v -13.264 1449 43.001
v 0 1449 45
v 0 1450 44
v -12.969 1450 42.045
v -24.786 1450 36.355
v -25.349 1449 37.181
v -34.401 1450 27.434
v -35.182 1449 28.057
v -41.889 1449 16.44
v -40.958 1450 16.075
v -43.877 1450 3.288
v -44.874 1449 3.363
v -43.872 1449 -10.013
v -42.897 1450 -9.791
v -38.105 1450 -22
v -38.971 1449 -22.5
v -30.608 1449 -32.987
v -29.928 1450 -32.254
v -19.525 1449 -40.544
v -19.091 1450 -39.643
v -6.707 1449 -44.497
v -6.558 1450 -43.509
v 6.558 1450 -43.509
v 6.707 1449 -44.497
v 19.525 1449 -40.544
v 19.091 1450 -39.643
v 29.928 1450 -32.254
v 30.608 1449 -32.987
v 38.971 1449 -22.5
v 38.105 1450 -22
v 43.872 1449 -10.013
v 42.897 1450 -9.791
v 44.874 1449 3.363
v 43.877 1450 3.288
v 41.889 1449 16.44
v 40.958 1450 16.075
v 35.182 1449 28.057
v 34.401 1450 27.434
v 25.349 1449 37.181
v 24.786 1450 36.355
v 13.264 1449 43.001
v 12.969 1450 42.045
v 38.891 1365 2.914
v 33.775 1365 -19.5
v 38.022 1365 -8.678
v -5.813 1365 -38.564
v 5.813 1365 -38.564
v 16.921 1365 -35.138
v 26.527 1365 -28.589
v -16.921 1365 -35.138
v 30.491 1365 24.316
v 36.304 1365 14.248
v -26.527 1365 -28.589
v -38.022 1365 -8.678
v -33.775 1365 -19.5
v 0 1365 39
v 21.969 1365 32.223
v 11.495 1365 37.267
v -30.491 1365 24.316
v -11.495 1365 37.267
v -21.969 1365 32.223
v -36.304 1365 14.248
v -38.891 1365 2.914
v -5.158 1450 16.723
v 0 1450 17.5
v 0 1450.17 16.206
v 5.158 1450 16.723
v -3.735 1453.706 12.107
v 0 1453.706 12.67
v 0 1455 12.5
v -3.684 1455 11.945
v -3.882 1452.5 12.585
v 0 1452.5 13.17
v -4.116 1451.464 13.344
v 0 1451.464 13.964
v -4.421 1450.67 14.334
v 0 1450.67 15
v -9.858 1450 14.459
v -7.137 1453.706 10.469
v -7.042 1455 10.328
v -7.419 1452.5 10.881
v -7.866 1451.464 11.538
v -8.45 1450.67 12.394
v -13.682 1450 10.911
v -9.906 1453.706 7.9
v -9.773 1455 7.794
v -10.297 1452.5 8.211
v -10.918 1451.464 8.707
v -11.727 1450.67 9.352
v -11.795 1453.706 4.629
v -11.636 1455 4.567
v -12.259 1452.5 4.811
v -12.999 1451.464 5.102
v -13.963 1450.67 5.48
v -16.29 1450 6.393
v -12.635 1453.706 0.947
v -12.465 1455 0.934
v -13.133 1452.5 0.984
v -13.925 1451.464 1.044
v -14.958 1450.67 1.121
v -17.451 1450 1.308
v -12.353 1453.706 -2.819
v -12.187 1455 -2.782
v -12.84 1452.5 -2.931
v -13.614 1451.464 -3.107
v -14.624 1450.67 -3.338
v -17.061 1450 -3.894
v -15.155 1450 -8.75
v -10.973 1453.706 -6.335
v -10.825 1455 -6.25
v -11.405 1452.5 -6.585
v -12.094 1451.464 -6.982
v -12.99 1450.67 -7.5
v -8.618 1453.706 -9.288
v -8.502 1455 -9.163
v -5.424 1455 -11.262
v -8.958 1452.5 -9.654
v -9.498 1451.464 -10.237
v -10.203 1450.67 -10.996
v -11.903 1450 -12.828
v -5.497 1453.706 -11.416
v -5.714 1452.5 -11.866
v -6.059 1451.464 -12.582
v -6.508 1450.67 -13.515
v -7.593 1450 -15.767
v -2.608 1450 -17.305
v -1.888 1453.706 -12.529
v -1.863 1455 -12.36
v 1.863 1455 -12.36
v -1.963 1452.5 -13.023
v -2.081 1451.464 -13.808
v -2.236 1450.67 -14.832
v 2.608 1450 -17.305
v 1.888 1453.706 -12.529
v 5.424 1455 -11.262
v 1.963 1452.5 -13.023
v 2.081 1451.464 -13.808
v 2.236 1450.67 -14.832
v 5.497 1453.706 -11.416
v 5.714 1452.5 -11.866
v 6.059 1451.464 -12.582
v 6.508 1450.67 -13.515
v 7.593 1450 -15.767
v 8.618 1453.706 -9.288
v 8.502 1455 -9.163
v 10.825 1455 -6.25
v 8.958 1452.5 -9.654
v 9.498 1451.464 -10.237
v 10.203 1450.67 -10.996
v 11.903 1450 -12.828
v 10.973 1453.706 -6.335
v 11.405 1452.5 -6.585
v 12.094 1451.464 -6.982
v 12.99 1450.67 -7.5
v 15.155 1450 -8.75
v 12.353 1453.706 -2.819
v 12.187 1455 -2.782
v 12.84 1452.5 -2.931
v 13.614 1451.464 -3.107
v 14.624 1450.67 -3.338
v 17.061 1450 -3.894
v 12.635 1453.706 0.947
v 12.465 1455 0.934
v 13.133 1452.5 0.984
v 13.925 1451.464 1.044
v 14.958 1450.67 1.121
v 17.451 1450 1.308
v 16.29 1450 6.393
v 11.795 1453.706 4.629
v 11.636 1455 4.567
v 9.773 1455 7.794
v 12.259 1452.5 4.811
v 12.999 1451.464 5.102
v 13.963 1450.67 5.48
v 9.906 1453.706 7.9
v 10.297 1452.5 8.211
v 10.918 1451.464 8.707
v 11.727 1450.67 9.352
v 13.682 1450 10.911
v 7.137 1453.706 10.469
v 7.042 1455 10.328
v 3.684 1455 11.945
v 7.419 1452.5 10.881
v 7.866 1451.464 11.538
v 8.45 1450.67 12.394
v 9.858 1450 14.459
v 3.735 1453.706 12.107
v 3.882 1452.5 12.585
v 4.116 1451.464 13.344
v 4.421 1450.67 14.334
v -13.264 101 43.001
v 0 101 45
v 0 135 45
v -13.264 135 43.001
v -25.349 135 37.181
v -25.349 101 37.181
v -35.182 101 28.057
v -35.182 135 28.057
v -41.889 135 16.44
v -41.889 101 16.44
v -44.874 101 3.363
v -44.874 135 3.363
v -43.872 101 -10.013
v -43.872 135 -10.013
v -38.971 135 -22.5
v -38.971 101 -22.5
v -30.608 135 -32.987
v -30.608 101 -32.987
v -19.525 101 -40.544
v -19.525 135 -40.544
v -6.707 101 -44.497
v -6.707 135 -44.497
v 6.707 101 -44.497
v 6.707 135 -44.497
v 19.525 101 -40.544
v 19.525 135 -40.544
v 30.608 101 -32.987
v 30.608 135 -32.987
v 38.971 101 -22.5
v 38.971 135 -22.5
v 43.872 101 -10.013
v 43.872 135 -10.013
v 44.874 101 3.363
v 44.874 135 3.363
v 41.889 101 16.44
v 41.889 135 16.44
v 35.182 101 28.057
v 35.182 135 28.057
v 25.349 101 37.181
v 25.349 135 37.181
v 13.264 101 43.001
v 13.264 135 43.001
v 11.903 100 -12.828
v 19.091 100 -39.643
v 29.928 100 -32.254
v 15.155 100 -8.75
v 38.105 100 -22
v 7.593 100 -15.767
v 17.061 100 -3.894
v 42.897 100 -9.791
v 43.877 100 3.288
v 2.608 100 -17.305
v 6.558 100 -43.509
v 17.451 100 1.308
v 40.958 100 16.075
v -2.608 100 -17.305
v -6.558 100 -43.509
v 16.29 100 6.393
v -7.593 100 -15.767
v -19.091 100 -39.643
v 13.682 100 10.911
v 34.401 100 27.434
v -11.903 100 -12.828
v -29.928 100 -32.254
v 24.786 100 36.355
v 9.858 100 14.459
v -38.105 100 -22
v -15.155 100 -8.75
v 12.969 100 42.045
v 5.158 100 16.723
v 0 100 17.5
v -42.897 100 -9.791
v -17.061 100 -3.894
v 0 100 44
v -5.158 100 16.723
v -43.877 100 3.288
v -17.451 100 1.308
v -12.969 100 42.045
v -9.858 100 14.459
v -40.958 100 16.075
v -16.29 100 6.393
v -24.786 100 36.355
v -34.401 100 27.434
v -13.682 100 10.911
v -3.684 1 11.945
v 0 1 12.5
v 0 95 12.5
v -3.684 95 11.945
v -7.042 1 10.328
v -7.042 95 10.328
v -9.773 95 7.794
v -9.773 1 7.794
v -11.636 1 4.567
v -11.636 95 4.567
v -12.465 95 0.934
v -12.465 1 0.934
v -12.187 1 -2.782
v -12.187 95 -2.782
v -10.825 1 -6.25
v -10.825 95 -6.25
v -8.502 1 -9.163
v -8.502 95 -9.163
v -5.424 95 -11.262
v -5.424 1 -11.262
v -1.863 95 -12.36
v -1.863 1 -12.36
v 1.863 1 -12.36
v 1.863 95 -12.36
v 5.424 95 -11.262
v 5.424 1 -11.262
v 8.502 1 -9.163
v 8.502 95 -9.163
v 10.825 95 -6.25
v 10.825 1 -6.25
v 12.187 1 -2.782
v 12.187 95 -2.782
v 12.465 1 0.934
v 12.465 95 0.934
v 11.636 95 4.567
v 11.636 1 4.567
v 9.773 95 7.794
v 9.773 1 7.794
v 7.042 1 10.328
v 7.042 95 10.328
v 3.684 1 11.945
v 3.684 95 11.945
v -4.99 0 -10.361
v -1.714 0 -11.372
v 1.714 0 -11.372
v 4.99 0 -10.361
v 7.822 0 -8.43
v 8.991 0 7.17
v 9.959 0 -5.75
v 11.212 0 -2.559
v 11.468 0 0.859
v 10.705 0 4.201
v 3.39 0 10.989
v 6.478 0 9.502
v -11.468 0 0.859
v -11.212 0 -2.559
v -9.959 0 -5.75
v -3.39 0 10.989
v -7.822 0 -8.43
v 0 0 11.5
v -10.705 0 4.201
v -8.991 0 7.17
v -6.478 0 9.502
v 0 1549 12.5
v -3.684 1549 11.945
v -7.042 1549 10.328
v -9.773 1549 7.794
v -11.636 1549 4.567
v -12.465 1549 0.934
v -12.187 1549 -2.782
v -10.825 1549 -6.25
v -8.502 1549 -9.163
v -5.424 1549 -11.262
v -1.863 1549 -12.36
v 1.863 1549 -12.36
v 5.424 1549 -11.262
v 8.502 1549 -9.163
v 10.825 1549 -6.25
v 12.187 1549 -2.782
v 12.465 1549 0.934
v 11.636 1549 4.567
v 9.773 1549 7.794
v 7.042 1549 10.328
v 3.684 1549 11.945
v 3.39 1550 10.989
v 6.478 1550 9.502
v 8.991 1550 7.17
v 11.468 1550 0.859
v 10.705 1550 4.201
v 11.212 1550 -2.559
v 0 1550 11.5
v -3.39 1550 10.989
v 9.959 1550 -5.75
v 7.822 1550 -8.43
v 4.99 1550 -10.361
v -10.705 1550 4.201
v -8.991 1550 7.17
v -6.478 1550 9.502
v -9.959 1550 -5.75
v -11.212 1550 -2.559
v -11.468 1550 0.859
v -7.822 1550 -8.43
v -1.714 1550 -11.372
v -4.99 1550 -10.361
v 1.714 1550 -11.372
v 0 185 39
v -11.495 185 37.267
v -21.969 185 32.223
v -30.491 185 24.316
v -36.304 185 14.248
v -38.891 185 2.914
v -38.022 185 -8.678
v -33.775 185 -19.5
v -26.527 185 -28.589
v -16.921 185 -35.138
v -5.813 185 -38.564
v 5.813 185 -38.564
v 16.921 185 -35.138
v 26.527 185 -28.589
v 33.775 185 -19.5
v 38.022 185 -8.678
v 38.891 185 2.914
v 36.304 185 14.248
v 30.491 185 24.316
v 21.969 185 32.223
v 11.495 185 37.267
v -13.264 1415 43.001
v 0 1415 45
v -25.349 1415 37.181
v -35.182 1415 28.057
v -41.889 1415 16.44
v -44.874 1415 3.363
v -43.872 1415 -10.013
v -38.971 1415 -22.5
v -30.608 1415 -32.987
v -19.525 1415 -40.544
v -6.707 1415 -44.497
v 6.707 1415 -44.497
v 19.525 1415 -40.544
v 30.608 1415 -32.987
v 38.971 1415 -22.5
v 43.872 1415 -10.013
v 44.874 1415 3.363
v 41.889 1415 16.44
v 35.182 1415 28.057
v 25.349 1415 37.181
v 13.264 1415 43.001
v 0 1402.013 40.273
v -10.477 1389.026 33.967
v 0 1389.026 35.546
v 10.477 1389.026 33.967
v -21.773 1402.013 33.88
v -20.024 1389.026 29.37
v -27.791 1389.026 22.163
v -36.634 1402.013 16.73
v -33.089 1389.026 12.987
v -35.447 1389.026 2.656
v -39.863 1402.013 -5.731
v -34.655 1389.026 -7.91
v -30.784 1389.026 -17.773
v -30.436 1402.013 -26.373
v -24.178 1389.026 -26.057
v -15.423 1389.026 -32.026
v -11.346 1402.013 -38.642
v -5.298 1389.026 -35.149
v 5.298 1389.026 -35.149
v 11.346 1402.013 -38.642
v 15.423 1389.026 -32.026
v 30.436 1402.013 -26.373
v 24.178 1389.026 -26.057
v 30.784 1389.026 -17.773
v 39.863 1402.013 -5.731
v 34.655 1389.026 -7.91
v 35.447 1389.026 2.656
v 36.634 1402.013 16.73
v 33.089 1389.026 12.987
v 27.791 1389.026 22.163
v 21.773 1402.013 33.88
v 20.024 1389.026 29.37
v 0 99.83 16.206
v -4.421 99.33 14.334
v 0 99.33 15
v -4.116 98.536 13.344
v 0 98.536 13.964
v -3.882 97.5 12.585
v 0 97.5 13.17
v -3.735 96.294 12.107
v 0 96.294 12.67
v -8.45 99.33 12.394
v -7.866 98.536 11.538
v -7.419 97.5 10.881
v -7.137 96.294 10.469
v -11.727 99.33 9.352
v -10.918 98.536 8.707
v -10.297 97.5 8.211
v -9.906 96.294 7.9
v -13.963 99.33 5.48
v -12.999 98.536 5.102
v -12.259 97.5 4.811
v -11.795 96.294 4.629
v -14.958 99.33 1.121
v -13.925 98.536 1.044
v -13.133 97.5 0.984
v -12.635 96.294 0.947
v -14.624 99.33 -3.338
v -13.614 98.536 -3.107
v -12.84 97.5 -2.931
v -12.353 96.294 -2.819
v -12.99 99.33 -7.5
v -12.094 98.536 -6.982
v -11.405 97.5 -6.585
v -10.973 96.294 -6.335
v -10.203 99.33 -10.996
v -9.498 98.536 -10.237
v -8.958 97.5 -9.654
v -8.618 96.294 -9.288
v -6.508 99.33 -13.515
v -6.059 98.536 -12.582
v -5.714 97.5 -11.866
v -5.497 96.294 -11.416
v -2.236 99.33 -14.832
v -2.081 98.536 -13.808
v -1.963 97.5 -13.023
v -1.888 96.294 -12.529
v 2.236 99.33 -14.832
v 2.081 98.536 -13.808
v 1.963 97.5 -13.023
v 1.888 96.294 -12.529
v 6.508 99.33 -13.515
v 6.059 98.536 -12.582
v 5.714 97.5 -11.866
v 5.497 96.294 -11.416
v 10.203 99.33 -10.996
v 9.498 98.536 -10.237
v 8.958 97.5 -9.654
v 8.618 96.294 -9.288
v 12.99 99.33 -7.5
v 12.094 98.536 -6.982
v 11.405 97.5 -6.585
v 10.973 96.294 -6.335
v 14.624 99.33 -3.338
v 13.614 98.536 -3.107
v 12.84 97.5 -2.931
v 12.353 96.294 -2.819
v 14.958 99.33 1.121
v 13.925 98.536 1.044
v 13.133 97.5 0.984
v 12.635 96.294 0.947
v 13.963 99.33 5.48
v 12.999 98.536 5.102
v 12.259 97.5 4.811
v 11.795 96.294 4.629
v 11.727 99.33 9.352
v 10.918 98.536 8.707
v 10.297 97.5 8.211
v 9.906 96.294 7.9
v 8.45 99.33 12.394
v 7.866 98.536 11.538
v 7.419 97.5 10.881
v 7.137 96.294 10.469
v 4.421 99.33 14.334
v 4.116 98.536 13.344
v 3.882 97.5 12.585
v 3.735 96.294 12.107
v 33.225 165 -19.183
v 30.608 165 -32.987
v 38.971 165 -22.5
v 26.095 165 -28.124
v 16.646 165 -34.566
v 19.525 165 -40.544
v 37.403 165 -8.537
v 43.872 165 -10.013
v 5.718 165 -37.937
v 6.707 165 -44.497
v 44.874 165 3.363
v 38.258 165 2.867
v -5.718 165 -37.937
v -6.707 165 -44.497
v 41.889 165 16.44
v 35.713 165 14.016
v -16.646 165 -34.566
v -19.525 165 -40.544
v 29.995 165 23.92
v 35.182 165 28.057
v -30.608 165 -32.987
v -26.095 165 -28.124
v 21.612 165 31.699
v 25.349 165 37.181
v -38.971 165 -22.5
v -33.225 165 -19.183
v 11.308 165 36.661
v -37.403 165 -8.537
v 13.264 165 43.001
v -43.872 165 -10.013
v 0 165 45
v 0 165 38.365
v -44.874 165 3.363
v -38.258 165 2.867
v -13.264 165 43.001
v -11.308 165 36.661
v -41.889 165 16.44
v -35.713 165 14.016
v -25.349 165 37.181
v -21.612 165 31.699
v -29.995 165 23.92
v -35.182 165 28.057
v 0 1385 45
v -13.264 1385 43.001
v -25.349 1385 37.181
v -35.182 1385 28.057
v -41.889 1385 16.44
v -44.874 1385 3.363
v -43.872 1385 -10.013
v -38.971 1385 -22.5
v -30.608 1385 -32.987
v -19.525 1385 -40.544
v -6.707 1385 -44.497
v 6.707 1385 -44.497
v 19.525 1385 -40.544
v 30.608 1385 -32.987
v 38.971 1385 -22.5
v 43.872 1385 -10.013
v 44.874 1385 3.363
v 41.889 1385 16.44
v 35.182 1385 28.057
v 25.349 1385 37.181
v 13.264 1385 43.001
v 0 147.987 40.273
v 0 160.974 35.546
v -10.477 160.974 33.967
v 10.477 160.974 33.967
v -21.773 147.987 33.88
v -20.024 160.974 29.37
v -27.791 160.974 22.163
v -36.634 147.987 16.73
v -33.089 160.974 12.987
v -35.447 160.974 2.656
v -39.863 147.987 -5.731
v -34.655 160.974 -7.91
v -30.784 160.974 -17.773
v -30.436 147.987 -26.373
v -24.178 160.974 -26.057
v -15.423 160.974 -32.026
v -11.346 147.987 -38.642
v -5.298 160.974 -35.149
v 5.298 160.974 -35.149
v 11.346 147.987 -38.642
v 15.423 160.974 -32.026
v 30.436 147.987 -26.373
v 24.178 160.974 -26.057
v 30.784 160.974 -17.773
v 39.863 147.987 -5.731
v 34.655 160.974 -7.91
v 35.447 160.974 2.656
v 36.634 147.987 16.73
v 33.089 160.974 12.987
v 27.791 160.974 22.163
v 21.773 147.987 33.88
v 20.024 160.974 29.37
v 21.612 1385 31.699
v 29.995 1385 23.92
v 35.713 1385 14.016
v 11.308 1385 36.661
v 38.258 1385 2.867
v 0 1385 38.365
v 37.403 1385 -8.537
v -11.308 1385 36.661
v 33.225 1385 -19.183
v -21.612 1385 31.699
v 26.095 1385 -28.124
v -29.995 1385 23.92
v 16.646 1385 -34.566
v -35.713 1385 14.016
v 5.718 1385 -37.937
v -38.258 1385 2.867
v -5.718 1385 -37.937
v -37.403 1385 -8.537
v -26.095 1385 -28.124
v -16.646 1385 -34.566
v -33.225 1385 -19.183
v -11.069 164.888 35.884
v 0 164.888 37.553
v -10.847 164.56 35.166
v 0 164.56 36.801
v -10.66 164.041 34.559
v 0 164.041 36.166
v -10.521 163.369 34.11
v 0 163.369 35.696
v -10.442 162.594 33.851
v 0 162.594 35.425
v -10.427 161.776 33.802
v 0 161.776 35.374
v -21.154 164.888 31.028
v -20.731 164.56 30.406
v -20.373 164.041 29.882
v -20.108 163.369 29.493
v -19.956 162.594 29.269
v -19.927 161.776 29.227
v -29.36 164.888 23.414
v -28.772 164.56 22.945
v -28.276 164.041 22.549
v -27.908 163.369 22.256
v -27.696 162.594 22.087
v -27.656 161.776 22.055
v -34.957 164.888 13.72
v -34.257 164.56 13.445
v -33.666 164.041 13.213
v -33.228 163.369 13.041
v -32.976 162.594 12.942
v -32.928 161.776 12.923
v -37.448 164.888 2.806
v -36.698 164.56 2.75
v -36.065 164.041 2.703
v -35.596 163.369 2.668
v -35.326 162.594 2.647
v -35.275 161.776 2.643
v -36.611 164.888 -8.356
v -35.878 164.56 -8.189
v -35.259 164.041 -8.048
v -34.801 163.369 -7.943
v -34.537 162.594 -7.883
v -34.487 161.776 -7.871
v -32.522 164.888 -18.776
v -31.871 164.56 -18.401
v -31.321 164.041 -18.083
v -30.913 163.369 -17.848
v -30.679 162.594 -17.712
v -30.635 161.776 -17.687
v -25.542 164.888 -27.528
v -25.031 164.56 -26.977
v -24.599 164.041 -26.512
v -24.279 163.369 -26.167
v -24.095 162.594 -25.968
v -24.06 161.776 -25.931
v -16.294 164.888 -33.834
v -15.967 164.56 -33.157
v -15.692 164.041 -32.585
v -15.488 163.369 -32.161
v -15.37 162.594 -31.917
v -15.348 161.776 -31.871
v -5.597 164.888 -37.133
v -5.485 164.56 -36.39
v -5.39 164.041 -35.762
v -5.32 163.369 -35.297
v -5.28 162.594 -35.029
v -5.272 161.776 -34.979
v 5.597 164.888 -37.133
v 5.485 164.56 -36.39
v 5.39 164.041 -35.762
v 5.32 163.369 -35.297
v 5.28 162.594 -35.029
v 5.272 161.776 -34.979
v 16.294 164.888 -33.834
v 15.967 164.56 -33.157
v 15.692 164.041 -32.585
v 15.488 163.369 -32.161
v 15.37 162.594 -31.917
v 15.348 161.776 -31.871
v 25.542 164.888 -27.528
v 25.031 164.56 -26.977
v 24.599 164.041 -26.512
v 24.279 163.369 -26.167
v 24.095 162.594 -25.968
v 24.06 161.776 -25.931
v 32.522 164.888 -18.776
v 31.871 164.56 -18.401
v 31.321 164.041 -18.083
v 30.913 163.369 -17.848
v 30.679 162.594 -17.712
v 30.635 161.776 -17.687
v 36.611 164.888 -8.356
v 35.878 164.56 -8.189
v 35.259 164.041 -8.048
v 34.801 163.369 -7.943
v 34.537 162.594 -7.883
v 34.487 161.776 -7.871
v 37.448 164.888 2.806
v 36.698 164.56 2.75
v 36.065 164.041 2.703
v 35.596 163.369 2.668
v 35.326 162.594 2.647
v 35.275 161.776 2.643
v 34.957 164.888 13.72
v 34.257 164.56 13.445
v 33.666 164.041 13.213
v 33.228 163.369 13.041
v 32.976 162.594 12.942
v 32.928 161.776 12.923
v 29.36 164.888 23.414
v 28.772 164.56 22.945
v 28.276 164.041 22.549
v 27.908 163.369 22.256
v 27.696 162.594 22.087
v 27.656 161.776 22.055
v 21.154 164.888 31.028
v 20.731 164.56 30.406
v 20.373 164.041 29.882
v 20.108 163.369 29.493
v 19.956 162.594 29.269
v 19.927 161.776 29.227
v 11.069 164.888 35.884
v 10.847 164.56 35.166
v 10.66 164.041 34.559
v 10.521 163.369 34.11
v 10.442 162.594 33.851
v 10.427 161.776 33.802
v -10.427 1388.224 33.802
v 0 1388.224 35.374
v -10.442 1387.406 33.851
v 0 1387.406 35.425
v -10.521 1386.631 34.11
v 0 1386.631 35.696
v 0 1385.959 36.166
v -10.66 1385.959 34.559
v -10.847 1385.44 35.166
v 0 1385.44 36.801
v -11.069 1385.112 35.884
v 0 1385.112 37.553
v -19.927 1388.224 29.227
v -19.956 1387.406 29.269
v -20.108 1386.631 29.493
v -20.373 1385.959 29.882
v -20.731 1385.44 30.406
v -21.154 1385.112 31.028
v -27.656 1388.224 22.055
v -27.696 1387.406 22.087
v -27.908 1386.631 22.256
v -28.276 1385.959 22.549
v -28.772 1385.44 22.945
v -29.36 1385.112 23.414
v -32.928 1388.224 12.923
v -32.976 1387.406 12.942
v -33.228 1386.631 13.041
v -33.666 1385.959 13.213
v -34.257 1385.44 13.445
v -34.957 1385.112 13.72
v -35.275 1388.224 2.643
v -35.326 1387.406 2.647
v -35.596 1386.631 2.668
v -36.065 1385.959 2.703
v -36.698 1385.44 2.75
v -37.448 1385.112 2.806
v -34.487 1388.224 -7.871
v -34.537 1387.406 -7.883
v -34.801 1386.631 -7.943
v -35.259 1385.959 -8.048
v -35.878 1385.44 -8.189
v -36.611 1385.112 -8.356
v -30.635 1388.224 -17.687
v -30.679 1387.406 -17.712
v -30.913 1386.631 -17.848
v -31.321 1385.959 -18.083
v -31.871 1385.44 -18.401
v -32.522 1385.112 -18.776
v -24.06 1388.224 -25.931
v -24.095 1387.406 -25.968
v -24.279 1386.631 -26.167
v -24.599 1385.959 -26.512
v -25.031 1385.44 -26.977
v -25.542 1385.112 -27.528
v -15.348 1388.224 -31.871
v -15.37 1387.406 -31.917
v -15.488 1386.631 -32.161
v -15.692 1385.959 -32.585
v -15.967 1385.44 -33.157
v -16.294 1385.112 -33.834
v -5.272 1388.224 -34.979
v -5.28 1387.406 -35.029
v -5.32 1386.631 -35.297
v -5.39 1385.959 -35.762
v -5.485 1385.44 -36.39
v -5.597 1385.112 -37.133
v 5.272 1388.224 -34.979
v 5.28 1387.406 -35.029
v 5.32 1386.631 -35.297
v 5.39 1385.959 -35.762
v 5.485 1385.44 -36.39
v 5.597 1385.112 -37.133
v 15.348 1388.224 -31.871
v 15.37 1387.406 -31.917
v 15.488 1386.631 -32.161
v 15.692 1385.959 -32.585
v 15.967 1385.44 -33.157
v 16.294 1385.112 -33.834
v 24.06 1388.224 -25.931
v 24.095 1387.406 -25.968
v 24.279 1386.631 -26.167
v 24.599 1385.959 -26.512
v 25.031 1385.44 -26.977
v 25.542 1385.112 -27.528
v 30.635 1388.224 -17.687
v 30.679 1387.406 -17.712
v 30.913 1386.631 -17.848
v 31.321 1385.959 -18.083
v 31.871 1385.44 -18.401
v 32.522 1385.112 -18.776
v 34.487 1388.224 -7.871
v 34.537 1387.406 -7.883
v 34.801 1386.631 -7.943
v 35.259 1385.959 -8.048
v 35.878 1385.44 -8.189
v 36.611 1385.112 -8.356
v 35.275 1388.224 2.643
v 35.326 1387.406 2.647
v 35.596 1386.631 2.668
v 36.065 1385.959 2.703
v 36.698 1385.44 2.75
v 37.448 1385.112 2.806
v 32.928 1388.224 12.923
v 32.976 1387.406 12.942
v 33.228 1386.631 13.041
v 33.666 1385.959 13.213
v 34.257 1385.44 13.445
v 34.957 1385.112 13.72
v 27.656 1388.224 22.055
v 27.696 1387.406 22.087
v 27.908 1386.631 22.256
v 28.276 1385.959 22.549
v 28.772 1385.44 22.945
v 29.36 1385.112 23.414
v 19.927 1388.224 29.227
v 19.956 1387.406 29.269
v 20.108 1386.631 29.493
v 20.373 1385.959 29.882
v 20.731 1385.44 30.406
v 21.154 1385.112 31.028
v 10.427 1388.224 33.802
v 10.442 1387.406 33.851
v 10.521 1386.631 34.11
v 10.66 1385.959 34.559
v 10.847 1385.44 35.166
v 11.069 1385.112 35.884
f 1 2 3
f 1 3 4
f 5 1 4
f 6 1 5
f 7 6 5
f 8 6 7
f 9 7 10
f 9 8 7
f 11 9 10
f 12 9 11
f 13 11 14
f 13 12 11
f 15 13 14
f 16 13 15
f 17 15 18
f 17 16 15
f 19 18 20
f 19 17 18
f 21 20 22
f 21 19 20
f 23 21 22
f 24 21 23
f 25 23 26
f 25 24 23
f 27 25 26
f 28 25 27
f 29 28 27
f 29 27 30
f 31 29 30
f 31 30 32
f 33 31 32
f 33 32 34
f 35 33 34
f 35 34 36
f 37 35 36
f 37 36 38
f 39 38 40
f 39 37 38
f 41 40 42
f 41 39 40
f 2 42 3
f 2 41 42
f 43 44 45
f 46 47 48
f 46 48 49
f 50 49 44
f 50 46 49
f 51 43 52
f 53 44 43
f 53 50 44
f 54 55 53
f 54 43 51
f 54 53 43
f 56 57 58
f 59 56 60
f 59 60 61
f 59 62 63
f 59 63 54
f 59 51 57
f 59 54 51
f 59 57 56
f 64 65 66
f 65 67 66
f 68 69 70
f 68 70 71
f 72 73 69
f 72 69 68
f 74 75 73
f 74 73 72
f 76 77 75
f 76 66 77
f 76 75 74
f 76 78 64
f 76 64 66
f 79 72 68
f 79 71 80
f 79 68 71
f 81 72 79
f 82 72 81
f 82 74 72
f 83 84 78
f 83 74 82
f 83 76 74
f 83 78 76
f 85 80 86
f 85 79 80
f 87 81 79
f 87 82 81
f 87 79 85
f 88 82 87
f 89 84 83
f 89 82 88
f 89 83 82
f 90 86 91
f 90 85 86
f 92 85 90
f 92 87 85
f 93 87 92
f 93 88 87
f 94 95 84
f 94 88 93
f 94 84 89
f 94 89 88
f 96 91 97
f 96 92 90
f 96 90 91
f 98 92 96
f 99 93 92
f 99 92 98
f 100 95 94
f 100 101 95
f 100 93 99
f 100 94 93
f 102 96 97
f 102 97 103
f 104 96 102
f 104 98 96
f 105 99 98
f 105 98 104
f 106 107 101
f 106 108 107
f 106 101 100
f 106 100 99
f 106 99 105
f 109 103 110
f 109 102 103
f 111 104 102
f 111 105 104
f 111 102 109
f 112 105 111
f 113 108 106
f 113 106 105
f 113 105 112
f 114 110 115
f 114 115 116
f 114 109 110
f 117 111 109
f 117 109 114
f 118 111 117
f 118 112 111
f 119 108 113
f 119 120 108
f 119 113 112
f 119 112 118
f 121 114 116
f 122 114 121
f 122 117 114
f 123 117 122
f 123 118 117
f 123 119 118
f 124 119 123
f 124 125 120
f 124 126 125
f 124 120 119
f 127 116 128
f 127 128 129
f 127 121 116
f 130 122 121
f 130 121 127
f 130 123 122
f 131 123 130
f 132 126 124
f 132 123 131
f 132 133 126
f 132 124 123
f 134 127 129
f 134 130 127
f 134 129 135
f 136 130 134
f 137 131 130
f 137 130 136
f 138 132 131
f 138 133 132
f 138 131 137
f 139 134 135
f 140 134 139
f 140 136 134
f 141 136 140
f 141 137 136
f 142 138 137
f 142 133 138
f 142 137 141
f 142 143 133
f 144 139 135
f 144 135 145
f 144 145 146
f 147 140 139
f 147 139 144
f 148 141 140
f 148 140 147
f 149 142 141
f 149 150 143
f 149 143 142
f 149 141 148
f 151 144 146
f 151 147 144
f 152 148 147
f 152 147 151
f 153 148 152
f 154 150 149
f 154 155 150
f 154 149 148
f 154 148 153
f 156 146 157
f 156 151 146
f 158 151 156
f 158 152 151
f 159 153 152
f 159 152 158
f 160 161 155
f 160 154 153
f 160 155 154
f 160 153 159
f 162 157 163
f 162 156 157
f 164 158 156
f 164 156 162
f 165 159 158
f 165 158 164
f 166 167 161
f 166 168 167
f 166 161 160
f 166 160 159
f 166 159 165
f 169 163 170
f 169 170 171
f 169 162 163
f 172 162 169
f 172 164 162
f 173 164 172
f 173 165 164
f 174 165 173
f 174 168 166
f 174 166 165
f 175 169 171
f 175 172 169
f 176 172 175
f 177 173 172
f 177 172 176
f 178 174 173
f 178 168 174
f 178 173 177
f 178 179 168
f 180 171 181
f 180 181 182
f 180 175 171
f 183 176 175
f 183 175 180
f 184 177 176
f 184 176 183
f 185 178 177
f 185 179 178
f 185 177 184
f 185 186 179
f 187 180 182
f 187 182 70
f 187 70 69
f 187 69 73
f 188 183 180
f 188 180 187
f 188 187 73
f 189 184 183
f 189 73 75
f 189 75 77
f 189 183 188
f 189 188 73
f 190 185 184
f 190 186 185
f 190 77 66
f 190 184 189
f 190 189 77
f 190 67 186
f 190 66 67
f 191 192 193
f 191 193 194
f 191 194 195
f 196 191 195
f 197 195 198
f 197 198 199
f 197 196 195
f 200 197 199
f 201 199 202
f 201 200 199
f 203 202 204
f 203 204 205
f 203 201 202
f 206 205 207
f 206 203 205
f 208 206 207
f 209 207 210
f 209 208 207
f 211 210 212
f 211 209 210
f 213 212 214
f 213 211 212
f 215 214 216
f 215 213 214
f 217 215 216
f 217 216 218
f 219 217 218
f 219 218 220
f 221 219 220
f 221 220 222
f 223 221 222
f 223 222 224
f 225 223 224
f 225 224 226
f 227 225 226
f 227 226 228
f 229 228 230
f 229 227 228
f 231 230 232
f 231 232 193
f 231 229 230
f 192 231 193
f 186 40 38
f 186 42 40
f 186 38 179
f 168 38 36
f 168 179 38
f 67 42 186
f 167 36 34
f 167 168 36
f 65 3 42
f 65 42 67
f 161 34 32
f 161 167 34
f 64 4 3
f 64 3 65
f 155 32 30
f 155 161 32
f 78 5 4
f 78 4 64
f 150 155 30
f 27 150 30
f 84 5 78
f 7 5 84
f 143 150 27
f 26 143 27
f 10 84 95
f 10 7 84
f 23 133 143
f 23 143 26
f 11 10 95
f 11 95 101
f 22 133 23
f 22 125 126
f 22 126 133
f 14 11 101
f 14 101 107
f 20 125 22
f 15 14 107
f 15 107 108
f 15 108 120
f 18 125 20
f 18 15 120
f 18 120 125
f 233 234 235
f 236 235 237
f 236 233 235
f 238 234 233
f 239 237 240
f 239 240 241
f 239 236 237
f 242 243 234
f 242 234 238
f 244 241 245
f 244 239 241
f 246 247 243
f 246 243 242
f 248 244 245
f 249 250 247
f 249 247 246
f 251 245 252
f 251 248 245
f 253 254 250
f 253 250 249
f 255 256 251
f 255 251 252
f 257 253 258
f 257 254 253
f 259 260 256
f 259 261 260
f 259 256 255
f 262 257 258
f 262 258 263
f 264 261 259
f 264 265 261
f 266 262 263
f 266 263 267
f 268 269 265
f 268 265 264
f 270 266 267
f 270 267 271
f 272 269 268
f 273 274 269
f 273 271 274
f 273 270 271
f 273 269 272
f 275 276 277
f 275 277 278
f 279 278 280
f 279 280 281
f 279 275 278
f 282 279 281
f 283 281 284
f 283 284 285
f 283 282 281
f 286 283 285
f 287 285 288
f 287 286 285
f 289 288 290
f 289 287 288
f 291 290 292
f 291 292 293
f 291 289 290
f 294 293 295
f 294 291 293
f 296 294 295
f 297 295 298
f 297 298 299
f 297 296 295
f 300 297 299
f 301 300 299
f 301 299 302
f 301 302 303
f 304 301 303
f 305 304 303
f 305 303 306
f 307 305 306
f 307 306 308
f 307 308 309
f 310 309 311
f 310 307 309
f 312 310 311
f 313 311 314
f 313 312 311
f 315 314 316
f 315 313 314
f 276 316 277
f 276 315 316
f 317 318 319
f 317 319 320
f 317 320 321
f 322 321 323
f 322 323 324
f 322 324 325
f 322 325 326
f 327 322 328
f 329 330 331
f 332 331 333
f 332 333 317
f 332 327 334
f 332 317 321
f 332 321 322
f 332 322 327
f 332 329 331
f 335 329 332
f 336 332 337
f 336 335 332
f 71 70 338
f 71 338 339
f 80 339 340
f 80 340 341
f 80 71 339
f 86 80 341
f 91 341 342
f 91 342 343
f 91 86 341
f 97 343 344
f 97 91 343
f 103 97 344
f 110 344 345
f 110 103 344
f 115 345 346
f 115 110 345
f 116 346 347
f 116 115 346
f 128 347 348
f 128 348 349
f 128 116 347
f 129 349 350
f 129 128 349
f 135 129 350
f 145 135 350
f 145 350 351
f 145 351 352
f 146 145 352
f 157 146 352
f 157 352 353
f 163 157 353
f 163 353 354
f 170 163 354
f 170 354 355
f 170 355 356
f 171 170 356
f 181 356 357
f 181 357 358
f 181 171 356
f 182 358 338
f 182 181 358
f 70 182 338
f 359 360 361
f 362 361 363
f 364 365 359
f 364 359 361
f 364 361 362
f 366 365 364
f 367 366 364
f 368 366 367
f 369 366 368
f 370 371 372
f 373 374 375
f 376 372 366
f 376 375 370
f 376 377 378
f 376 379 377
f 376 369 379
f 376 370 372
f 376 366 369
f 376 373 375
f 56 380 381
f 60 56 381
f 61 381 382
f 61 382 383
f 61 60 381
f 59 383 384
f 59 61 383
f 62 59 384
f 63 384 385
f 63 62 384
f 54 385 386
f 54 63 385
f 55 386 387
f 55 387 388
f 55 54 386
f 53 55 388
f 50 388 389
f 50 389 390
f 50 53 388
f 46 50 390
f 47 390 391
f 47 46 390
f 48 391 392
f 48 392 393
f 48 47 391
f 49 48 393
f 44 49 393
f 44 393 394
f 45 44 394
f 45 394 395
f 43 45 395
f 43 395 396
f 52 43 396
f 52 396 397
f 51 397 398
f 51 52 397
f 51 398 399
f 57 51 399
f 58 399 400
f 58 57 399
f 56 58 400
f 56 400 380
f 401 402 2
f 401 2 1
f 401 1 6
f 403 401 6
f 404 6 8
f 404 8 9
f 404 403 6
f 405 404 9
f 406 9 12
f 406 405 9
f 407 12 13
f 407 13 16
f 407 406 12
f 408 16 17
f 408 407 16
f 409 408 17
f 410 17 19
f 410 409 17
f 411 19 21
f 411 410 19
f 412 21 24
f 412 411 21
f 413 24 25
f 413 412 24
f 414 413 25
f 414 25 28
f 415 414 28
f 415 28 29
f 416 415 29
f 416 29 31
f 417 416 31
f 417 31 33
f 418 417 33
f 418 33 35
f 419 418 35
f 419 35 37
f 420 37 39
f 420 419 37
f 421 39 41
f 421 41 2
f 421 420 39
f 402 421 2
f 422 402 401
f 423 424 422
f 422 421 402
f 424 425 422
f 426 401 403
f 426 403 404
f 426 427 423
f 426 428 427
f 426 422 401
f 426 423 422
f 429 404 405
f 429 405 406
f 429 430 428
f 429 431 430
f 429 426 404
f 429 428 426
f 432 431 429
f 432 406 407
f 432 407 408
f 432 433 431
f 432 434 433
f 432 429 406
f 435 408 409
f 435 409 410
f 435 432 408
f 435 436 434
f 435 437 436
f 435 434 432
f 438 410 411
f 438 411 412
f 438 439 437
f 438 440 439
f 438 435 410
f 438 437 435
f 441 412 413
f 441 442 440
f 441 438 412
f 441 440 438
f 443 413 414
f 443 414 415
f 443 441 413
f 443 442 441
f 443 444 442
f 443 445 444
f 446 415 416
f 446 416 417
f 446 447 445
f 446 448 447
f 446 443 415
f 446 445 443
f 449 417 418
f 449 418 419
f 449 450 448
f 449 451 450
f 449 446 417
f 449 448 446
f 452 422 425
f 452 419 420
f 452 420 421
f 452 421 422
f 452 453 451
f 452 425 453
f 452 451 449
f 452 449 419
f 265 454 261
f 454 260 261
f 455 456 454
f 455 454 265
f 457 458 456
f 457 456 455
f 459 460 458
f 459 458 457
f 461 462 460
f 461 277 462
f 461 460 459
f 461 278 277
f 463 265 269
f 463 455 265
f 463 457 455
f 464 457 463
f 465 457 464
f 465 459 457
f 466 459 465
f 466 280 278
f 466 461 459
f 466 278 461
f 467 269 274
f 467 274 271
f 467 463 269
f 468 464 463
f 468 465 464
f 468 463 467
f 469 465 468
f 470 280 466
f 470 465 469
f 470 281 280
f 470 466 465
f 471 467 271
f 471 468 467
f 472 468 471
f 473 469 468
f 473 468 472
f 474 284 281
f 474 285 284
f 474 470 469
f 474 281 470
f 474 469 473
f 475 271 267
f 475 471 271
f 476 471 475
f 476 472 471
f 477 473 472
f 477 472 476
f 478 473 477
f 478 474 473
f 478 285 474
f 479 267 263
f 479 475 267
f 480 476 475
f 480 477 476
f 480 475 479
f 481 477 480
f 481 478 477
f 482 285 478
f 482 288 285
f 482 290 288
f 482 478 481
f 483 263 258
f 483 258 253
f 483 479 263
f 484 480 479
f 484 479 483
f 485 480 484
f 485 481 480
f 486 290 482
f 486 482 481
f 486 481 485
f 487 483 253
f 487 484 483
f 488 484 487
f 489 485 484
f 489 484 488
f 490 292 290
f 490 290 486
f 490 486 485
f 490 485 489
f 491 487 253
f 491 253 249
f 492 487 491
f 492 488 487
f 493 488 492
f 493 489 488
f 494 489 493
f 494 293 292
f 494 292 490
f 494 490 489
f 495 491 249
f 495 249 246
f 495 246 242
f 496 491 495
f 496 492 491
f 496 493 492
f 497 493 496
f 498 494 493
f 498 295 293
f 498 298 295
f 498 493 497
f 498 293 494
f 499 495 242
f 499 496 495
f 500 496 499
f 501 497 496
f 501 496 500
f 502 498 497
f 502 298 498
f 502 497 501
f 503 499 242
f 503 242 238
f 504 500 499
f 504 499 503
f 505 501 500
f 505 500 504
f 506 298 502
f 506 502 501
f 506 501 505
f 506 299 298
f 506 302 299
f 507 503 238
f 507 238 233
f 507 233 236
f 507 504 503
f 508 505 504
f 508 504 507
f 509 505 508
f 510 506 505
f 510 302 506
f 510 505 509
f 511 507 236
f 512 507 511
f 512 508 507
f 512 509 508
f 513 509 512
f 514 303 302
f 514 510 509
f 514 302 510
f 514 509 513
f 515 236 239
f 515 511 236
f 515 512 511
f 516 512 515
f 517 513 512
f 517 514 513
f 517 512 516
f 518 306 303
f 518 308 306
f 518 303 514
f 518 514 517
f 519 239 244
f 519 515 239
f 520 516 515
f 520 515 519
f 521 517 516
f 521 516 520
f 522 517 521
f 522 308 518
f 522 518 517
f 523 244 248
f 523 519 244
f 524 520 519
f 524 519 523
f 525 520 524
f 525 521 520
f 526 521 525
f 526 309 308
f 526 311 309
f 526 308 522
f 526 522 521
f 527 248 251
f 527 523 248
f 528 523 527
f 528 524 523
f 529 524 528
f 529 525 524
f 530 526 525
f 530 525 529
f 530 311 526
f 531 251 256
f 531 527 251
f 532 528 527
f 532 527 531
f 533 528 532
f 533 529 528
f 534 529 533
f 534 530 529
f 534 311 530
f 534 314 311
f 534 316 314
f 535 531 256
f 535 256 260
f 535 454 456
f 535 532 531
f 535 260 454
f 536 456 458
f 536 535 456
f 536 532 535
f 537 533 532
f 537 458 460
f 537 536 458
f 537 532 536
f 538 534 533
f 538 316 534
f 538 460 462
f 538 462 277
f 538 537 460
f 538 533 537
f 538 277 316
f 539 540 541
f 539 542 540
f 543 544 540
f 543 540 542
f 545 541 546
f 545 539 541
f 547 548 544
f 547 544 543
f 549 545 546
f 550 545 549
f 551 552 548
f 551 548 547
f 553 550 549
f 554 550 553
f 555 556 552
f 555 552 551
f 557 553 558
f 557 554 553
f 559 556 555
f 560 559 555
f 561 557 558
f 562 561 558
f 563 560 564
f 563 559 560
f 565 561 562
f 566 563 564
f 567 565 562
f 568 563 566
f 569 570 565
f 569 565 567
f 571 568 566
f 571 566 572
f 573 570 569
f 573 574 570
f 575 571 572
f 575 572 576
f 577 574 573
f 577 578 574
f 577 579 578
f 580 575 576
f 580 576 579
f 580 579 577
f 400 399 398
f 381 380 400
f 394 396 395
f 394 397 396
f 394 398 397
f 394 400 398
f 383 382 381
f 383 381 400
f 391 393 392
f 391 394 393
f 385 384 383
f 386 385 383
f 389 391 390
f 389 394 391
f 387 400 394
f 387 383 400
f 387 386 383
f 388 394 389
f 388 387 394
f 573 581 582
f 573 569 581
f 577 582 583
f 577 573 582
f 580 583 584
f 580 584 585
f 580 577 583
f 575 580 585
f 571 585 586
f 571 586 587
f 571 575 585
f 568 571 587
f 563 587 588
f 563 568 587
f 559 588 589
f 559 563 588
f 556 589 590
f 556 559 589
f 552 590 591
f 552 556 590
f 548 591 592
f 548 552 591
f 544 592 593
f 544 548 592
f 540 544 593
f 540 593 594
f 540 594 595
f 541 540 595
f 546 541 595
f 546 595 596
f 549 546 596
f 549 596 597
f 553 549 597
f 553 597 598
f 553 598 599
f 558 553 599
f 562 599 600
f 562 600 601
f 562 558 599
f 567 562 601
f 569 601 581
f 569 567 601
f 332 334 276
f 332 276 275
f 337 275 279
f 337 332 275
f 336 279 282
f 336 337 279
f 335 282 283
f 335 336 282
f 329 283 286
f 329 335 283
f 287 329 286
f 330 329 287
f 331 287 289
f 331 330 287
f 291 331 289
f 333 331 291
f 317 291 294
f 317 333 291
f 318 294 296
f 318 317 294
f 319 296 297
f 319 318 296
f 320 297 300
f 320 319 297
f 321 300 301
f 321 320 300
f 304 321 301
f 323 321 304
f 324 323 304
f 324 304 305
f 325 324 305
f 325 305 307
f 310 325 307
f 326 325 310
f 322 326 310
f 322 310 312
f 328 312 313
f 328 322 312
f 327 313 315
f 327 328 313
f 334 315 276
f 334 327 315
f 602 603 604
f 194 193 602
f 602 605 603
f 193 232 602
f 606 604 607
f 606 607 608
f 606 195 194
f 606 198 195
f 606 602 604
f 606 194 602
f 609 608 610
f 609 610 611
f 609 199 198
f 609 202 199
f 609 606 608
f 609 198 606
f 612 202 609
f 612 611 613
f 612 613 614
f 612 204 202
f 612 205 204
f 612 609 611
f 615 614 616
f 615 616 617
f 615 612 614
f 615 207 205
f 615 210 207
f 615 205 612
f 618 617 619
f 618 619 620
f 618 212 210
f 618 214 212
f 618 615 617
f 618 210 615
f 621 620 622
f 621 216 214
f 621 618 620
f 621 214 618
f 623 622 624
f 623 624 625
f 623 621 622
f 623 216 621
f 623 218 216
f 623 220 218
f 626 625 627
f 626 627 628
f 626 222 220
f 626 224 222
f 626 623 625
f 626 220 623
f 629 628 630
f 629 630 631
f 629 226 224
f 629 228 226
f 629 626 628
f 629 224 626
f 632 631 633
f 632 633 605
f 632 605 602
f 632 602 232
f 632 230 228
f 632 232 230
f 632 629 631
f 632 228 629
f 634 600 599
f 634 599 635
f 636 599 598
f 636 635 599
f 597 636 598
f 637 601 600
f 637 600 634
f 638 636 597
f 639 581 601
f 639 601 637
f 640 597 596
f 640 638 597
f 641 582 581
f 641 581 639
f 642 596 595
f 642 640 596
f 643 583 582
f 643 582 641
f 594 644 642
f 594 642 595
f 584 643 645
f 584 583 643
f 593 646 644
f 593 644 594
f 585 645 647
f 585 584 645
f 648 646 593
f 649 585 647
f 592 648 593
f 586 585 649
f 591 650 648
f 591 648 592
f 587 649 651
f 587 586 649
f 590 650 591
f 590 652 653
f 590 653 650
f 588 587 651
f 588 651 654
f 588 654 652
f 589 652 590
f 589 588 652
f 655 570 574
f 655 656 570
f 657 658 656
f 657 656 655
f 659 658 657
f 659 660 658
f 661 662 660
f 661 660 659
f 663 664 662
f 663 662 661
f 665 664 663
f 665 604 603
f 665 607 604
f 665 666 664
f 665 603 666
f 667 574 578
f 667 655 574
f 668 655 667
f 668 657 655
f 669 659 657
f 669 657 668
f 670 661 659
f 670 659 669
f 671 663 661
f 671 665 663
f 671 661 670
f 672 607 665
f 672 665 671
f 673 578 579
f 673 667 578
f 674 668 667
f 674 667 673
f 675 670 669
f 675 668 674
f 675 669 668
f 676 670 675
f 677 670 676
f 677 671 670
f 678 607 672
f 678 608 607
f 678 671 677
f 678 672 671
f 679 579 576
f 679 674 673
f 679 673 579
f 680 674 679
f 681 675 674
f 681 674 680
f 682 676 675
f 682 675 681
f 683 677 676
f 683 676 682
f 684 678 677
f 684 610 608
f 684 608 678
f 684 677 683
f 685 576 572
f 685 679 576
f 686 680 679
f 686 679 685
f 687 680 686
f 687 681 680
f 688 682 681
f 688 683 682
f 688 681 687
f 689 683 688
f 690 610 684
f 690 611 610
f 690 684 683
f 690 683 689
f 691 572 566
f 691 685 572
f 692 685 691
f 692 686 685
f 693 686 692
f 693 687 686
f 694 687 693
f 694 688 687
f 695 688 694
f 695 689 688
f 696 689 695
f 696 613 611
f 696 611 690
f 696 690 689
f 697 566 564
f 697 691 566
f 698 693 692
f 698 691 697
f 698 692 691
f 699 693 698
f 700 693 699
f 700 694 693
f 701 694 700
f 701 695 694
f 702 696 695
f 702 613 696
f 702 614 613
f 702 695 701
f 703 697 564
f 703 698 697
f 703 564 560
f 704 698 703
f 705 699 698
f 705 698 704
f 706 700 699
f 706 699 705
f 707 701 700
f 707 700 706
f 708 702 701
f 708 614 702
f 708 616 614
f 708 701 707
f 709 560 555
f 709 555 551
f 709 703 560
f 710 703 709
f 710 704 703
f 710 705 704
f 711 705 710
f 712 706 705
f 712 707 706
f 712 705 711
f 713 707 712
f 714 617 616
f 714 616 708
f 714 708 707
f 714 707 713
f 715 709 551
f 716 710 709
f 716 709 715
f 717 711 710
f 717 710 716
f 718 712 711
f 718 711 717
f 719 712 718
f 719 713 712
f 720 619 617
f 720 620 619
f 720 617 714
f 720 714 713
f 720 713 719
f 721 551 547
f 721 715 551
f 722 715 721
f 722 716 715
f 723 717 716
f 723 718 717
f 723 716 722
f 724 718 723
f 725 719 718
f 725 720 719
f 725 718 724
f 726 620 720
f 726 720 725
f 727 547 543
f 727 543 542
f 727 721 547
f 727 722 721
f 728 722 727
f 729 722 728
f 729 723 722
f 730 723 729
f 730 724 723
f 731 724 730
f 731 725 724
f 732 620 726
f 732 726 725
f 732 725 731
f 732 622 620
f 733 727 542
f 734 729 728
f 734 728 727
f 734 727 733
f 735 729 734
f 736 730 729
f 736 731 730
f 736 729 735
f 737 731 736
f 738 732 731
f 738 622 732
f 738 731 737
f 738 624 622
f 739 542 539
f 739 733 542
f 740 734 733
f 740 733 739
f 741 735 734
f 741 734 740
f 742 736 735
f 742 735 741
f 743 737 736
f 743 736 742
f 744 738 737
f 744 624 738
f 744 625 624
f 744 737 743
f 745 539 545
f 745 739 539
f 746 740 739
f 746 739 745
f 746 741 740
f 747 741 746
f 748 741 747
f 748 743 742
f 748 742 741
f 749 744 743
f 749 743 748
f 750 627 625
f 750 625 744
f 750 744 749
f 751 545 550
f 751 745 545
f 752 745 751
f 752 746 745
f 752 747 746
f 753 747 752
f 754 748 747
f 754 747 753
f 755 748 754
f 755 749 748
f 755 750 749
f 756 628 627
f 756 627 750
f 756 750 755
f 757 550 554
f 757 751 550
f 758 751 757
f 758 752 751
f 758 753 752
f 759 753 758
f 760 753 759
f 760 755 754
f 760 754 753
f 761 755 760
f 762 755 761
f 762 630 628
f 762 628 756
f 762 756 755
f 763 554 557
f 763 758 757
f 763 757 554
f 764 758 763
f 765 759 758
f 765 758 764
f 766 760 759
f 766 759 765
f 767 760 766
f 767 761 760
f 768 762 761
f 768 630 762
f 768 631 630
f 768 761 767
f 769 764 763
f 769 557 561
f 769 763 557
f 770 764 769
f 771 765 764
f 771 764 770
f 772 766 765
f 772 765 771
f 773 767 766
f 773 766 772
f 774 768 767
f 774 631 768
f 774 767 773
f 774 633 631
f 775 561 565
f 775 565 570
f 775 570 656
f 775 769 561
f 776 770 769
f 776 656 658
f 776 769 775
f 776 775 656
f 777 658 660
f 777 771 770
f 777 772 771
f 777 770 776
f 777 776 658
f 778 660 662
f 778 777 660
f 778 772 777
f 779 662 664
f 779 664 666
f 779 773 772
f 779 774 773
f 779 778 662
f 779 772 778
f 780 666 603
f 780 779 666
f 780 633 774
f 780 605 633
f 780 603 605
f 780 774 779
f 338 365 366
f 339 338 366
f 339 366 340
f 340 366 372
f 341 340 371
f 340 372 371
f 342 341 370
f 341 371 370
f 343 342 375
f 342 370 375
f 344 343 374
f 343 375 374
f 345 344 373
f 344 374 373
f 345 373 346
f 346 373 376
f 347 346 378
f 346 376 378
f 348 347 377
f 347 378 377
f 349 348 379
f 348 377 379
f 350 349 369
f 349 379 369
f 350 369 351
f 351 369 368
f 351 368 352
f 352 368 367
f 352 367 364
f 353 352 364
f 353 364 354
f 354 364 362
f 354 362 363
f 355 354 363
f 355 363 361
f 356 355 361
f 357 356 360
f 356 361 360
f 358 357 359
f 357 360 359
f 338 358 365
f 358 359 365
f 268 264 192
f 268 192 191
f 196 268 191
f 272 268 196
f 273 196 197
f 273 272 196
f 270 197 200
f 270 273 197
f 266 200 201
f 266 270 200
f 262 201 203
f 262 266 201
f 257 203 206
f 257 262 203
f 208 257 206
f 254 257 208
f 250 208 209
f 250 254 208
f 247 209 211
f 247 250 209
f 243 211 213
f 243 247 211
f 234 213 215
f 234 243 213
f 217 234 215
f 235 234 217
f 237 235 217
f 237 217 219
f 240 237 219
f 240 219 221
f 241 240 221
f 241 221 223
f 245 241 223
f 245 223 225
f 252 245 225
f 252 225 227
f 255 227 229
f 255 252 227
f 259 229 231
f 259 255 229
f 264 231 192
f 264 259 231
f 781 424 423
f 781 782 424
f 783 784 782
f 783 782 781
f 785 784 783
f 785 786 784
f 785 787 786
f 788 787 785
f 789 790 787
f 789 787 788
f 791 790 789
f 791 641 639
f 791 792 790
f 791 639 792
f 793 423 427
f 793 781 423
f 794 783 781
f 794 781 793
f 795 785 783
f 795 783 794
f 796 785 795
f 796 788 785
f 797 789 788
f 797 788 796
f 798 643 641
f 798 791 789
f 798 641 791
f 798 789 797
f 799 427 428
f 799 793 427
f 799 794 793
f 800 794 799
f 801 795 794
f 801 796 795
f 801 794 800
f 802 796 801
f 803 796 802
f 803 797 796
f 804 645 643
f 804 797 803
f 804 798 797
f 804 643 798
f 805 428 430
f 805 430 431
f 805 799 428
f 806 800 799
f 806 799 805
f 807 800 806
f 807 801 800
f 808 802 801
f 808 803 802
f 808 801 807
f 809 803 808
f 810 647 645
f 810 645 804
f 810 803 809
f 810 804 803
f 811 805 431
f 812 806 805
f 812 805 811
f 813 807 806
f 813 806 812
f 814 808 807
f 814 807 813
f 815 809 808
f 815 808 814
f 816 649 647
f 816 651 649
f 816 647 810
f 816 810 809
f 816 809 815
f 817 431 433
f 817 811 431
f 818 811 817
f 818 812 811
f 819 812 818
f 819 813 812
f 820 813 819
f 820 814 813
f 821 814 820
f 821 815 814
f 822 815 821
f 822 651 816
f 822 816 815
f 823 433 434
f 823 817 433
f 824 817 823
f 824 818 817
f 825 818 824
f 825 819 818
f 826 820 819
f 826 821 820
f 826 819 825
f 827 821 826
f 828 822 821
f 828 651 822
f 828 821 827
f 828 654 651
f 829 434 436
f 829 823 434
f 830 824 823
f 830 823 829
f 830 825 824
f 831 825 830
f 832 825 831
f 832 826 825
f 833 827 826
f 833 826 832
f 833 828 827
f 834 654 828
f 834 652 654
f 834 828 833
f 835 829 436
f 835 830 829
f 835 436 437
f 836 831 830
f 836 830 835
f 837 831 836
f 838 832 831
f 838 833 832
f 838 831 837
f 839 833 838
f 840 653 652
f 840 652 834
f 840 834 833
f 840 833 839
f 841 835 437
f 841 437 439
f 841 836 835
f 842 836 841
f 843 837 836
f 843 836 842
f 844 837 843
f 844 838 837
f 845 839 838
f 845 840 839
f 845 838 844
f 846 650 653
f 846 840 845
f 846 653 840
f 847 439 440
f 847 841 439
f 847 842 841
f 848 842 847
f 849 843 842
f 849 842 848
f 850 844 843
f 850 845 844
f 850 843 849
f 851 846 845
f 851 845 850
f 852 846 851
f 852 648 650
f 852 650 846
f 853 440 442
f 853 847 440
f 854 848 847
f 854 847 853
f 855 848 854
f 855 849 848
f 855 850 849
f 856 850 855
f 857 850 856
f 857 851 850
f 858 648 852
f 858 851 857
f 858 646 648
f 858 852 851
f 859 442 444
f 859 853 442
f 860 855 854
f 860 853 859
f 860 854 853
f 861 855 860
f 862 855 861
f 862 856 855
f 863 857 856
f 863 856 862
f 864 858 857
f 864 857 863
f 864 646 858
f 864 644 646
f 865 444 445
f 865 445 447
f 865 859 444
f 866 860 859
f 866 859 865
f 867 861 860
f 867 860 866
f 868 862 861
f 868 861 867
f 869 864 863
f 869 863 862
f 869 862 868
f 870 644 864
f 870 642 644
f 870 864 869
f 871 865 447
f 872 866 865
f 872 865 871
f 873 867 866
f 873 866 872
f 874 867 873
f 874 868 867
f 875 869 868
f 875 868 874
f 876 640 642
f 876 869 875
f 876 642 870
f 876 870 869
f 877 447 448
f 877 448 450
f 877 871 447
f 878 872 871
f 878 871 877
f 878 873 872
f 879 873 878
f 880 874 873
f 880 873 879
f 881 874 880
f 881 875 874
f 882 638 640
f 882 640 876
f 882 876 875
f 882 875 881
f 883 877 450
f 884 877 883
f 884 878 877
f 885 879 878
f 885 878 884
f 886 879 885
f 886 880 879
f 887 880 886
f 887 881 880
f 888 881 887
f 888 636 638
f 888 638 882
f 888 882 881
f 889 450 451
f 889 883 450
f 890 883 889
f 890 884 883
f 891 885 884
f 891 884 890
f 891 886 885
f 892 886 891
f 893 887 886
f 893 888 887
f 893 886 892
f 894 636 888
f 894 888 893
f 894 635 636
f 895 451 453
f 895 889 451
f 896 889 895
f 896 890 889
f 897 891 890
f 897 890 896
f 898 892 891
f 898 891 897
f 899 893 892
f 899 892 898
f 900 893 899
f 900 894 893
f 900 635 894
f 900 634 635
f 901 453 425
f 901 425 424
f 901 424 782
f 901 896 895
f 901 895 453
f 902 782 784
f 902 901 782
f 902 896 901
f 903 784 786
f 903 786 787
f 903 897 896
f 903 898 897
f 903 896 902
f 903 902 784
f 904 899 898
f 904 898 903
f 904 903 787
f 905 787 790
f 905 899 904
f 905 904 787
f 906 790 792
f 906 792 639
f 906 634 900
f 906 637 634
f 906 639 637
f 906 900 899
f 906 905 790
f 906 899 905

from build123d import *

# Parameters (mm, degrees)
F2_R    = 5
F3_SIZE = 1


with BuildPart() as f1:
    # F0 (on Right) → F1 (revolve)
    with BuildSketch(Plane.YZ):
        with BuildLine():
            Line((0, 12.5), (0, 0))
            Line((0, 0), (185, 0))
            Line((185, 0), (185, 39))
            Line((185, 39), (1365, 39))
            Line((1365, 39), (1365, 0))
            Line((1365, 0), (1550, 0))
            Line((1550, 0), (1550, 12.5))
            Line((1550, 12.5), (1450, 12.5))
            Line((1450, 12.5), (1450, 45))
            Line((1450, 45), (1415, 45))
            Line((1415, 45), (1389.02606, 35.546259))
            ThreePointArc((1389.02606, 35.546259), (1386.279271, 35.907881), (1385, 38.365337))
            Line((1385, 38.365337), (1385, 45))
            Line((1385, 45), (165, 45))
            Line((165, 45), (165, 38.365337))
            ThreePointArc((165, 38.365337), (163.720729, 35.907881), (160.97394, 35.546259))
            Line((160.97394, 35.546259), (135, 45))
            Line((135, 45), (100, 45))
            Line((100, 45), (100, 12.5))
            Line((100, 12.5), (0, 12.5))
        make_face()
    revolve(axis=Axis((0, 1457.5, 0), (0, -1, 0)))

    # F2
    f2_edges = [f1.edges().sort_by_distance(p)[0] for p in [
        (0, 1450, -12.5),
        (0, 100, -12.5),
    ]]
    fillet(f2_edges, radius=F2_R)

    # F3
    f3_edges = [f1.edges().sort_by_distance(p)[0] for p in [
        (0, 1450, -45),
        (0, 1550, -12.5),
        (0, 0, -12.5),
        (0, 100, -45),
    ]]
    chamfer(f3_edges, length=F3_SIZE)


solid = f1.part
